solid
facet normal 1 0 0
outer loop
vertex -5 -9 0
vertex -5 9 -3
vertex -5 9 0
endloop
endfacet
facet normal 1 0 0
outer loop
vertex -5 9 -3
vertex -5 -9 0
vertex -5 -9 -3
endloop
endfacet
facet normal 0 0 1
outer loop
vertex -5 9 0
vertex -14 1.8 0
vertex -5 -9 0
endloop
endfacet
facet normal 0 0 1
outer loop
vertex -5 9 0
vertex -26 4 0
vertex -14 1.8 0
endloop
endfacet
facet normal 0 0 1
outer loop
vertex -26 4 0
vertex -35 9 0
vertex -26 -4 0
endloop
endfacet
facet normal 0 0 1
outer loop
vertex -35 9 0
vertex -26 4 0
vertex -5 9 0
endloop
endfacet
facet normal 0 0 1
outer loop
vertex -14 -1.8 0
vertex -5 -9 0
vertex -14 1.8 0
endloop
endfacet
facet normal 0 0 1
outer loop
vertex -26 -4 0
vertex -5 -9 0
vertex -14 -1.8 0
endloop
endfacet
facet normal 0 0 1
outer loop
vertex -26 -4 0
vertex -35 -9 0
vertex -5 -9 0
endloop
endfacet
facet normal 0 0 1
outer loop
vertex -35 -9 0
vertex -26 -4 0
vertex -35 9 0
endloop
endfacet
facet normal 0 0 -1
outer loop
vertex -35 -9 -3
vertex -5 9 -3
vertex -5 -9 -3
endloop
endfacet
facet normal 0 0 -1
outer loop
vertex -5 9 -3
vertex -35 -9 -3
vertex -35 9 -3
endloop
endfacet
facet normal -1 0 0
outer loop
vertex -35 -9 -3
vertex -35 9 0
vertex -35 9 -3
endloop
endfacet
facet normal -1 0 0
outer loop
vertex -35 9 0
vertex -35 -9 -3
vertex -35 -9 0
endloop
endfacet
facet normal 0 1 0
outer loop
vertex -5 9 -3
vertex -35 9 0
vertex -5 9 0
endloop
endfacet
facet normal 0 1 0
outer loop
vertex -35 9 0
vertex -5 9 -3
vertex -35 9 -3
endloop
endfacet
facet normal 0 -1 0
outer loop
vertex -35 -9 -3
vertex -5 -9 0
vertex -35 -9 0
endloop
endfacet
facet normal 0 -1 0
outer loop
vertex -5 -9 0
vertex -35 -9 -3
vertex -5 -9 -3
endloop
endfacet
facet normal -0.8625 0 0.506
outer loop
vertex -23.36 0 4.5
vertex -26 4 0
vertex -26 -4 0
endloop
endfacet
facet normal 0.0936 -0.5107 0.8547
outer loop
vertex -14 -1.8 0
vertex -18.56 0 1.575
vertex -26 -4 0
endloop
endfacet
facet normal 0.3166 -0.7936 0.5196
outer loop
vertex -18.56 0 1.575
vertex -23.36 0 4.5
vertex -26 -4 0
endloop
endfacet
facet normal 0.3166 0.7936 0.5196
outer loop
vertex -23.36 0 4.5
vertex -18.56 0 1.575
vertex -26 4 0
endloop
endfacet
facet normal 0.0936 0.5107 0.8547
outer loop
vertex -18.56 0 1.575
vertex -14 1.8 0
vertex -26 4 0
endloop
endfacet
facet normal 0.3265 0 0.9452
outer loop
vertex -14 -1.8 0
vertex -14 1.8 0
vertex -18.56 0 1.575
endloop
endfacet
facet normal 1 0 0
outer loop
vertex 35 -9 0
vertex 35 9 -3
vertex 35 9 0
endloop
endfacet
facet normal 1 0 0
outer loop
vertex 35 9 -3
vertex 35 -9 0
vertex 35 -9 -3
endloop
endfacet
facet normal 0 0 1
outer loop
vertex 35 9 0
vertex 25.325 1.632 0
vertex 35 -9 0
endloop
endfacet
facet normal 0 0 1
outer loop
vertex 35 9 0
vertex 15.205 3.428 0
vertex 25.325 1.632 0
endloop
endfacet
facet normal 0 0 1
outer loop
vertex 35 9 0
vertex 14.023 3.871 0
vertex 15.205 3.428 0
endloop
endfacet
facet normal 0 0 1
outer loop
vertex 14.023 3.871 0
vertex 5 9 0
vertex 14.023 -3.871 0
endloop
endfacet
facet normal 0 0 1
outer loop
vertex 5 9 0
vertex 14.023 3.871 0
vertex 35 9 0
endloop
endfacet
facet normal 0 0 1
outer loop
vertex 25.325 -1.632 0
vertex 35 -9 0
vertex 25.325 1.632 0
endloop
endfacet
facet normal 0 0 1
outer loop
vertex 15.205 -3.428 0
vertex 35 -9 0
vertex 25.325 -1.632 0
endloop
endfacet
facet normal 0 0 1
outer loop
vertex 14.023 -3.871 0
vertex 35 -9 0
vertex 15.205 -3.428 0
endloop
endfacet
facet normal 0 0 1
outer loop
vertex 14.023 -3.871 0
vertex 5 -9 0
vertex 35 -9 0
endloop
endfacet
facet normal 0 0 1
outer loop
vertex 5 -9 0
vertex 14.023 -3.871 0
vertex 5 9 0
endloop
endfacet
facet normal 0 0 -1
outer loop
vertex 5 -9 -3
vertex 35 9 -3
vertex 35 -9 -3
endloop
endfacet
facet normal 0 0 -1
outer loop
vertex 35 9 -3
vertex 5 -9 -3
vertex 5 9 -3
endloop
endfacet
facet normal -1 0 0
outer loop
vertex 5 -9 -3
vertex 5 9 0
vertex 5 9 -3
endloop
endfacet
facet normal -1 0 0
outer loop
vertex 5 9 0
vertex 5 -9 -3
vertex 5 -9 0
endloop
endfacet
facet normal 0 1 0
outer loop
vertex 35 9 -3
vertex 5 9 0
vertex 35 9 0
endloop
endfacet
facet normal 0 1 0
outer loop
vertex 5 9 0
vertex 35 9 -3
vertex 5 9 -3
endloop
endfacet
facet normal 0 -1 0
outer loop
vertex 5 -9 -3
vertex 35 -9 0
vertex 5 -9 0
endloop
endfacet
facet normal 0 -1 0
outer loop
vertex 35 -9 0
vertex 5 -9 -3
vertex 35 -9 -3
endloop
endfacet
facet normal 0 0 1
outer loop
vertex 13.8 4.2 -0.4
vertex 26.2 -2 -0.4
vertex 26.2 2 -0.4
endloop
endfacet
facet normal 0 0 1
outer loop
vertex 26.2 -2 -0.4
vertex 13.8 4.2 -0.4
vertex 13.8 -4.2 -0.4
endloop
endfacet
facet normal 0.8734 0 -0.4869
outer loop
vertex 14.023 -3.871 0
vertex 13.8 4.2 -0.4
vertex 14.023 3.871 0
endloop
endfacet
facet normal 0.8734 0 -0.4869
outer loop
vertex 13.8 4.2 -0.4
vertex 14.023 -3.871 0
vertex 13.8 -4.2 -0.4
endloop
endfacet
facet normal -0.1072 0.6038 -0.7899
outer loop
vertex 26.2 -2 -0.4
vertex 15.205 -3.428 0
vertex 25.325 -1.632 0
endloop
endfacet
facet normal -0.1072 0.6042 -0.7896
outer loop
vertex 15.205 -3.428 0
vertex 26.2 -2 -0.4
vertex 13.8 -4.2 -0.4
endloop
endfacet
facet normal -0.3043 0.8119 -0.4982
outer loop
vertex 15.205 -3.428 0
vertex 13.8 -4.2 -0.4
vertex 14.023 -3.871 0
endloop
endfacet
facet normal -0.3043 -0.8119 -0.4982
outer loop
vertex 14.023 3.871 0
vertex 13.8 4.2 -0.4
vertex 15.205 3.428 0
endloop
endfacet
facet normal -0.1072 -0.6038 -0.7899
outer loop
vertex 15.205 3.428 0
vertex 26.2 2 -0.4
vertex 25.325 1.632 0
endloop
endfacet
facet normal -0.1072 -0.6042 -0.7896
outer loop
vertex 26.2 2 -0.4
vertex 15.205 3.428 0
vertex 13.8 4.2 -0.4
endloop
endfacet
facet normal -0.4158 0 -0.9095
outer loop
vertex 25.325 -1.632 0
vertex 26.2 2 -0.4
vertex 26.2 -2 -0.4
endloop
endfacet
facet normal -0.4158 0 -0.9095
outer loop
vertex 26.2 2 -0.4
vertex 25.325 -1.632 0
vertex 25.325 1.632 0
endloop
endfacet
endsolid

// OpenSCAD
// Faceted ridge key — asymmetric male/female alignment feature, flat facets only.
//
// 6 vertices, 7 faces, one closed manifold. Euler check: V - E + F = 6 - 11 + 7 = 2.
// No spheres, no cylinders, no splines, no fillets.
//
// THE FLANKS ARE TRIANGULATED EXPLICITLY, and that is not cosmetic. Written as quads
// [0,3,5,4] and [1,4,5,2] they are NOT planar — the base edge and the ridge edge are
// skew, so the four corners do not share a plane. A checker caught this after the first
// draft claimed the opposite. Left as quads, the tessellator picks the fold direction for
// you, which means the "flat facet" promise is broken by an unspecified crease and two
// exporters can disagree about the shape. Splitting them here fixes the crease at
// back-bottom -> front-ridge, which keeps the rear peak's triangle large and clean.
//
// FRAME CONVENTION (matches the CAD mate connector it is derived from):
//   +Z  the mating axis   — the feature protrudes along it
//   +X  the roll reference — the ridge runs along it, low end forward
//   +Y  completes the right-handed frame
//
// WHAT BREAKS WHICH SYMMETRY
//   rotational about Z ....... the ridge (elongation along X)
//   180 deg about Z .......... the ridge SLOPE: tall steep back, long shallow front
//   mirror across XZ ......... deliberately NOT broken. Handedness is fixed by convention,
//                              so +Y is implied once Z and X are known. Breaking it would
//                              add a facet and buy nothing.
//
// KNOWN AMBIGUITY, stated rather than hidden: viewed exactly ALONG the ridge (+/-X,
// orthographic), the silhouette is the same isoceles triangle from front and back. Front
// and back are then distinguished by SHADING only — the long shallow front face catches
// light differently from the steep back face. If the target renderer is flat-shaded with a
// single headlight, verify this case before committing to the shape.

// ---------------------------------------------------------------- parameters
L   = 12.0;   // overall length along the ridge (X)
W   = 4.0;    // half-width at the BACK
tf  = 0.45;   // front taper: front half-width = W * tf
H   = 4.5;    // peak height at the rear   <-- the single dimension controlling asymmetry
pr  = 0.22;   // rear ridge position, fraction of L from the back
pf  = 0.62;   // front ridge position, fraction of L from the back
hf  = 0.35;   // front ridge height, fraction of H

// Clearance is a PHYSICAL quantity and only means anything if this is a printed part.
// See the note at the bottom: for a viewport glyph it is meaningless.
clr    = 0.20;  // per-face clearance, mm
depth  = 0.40;  // extra pocket depth so the male never bottoms out before it seats

Wf  = W * tf;
xr0 = -L/2 + L * pr;
xr1 = -L/2 + L * pf;
Hf  = H * hf;

// ---------------------------------------------------------------- geometry
// Vertex order is fixed and referenced by the face table; do not reorder.
//   0 back-left    1 back-right    2 front-right    3 front-left
//   4 REAR PEAK (tall)             5 front ridge (low)
function ridge_pts(l, w, wf, h, hfr, x0, x1) = [
    [-l/2, -w,   0  ],   // 0
    [-l/2,  w,   0  ],   // 1
    [ l/2,  wf,  0  ],   // 2
    [ l/2, -wf,  0  ],   // 3
    [ x0,   0,   h  ],   // 4  rear peak
    [ x1,   0,   hfr]    // 5  front ridge, low
];

// OpenSCAD wants each face wound CLOCKWISE seen from OUTSIDE. The right-hand-rule
// outward-normal (CCW) form is given in the comment for anyone porting to STL/OCC,
// where the opposite convention is the usual one.
RIDGE_FACES = [
    [3, 2, 1, 0],   // base       (CCW-outward: [0,1,2,3])   planar, all z=0
    [1, 4, 0],      // back       (CCW-outward: [0,4,1])     steep
    [5, 3, 0],      // flank -Y a (CCW-outward: [0,3,5])
    [4, 5, 0],      // flank -Y b (CCW-outward: [0,5,4])
    [5, 4, 1],      // flank +Y a (CCW-outward: [1,4,5])
    [2, 5, 1],      // flank +Y b (CCW-outward: [1,5,2])
    [5, 2, 3]       // front      (CCW-outward: [3,2,5])     long, shallow
];

module ridge_key(l = L, w = W, wf = Wf, h = H, hfr = Hf, x0 = xr0, x1 = xr1) {
    polyhedron(points = ridge_pts(l, w, wf, h, hfr, x0, x1),
               faces  = RIDGE_FACES,
               convexity = 3);
}

// MALE: the protrusion, nominal size.
module ridge_key_male() { ridge_key(); }

// FEMALE: the pocket. Grown by `clr` on every side and sunk `depth` deeper.
//
// HONEST LIMITATION: this grows the key by scaling its defining dimensions, which is NOT a
// true uniform surface offset — on the shallow front face the normal clearance comes out
// smaller than `clr`, because that face is far from perpendicular to every axis it is
// scaled along. A true offset needs minkowski() with a small cube, which is exact and slow,
// or an explicit per-face plane push, which is exact and fiddly. For a keying feature whose
// job is angular registration rather than a press fit, the approximation is the right trade
// — but do not quote this pocket as holding 0.2 mm everywhere, because it does not.
module ridge_key_female() {
    translate([0, 0, -depth])
        ridge_key(l   = L + 2*clr,
                  w   = W + clr,
                  wf  = Wf + clr,
                  h   = H + clr + depth,
                  hfr = Hf + clr + depth,
                  x0  = xr0,
                  x1  = xr1);
}

// ---------------------------------------------------------------- demo
// Left: the male key on its plate. Right: the plate with the pocket cut.
PLATE = [30, 18, 3];

module plate_with_male() {
    translate([-PLATE[0]/2, -PLATE[1]/2, -PLATE[2]]) cube(PLATE);
    ridge_key_male();
}

module plate_with_female() {
    difference() {
        translate([-PLATE[0]/2, -PLATE[1]/2, -PLATE[2]]) cube(PLATE);
        ridge_key_female();
    }
}

translate([-20, 0, 0]) plate_with_male();
translate([ 20, 0, 0]) plate_with_female();

// ---------------------------------------------------------------- note on the two readings
// This file is written for the PHYSICAL reading: a printable alignment key, where `clr` and
// `depth` are real millimetres and flat facets genuinely help — they slice without the
// stair-stepping a tessellated curve produces, and they print without support on the
// shallow front face.
//
// If the intent is instead the VIEWPORT GLYPH for a CAD mate connector, then:
//   - `clr` and `depth` are meaningless: a symbol does not mate with anything;
//   - all dimensions must become SCREEN PIXELS scaled by upp = 1/zoom, because every gizmo
//     in that viewport is screen-constant and must not shrink with the model;
//   - "low-poly for rendering performance" is not a real reason at ~2-20 glyphs per frame.
//     The real reason to keep flat facets there is LEGIBILITY: hard normals give distinct
//     value steps between facets, and that is what lets a 22-px solid read as an oriented
//     object instead of a grey blob.
// The vertex logic above is identical under both readings. Only the units and the clearance
// change.
